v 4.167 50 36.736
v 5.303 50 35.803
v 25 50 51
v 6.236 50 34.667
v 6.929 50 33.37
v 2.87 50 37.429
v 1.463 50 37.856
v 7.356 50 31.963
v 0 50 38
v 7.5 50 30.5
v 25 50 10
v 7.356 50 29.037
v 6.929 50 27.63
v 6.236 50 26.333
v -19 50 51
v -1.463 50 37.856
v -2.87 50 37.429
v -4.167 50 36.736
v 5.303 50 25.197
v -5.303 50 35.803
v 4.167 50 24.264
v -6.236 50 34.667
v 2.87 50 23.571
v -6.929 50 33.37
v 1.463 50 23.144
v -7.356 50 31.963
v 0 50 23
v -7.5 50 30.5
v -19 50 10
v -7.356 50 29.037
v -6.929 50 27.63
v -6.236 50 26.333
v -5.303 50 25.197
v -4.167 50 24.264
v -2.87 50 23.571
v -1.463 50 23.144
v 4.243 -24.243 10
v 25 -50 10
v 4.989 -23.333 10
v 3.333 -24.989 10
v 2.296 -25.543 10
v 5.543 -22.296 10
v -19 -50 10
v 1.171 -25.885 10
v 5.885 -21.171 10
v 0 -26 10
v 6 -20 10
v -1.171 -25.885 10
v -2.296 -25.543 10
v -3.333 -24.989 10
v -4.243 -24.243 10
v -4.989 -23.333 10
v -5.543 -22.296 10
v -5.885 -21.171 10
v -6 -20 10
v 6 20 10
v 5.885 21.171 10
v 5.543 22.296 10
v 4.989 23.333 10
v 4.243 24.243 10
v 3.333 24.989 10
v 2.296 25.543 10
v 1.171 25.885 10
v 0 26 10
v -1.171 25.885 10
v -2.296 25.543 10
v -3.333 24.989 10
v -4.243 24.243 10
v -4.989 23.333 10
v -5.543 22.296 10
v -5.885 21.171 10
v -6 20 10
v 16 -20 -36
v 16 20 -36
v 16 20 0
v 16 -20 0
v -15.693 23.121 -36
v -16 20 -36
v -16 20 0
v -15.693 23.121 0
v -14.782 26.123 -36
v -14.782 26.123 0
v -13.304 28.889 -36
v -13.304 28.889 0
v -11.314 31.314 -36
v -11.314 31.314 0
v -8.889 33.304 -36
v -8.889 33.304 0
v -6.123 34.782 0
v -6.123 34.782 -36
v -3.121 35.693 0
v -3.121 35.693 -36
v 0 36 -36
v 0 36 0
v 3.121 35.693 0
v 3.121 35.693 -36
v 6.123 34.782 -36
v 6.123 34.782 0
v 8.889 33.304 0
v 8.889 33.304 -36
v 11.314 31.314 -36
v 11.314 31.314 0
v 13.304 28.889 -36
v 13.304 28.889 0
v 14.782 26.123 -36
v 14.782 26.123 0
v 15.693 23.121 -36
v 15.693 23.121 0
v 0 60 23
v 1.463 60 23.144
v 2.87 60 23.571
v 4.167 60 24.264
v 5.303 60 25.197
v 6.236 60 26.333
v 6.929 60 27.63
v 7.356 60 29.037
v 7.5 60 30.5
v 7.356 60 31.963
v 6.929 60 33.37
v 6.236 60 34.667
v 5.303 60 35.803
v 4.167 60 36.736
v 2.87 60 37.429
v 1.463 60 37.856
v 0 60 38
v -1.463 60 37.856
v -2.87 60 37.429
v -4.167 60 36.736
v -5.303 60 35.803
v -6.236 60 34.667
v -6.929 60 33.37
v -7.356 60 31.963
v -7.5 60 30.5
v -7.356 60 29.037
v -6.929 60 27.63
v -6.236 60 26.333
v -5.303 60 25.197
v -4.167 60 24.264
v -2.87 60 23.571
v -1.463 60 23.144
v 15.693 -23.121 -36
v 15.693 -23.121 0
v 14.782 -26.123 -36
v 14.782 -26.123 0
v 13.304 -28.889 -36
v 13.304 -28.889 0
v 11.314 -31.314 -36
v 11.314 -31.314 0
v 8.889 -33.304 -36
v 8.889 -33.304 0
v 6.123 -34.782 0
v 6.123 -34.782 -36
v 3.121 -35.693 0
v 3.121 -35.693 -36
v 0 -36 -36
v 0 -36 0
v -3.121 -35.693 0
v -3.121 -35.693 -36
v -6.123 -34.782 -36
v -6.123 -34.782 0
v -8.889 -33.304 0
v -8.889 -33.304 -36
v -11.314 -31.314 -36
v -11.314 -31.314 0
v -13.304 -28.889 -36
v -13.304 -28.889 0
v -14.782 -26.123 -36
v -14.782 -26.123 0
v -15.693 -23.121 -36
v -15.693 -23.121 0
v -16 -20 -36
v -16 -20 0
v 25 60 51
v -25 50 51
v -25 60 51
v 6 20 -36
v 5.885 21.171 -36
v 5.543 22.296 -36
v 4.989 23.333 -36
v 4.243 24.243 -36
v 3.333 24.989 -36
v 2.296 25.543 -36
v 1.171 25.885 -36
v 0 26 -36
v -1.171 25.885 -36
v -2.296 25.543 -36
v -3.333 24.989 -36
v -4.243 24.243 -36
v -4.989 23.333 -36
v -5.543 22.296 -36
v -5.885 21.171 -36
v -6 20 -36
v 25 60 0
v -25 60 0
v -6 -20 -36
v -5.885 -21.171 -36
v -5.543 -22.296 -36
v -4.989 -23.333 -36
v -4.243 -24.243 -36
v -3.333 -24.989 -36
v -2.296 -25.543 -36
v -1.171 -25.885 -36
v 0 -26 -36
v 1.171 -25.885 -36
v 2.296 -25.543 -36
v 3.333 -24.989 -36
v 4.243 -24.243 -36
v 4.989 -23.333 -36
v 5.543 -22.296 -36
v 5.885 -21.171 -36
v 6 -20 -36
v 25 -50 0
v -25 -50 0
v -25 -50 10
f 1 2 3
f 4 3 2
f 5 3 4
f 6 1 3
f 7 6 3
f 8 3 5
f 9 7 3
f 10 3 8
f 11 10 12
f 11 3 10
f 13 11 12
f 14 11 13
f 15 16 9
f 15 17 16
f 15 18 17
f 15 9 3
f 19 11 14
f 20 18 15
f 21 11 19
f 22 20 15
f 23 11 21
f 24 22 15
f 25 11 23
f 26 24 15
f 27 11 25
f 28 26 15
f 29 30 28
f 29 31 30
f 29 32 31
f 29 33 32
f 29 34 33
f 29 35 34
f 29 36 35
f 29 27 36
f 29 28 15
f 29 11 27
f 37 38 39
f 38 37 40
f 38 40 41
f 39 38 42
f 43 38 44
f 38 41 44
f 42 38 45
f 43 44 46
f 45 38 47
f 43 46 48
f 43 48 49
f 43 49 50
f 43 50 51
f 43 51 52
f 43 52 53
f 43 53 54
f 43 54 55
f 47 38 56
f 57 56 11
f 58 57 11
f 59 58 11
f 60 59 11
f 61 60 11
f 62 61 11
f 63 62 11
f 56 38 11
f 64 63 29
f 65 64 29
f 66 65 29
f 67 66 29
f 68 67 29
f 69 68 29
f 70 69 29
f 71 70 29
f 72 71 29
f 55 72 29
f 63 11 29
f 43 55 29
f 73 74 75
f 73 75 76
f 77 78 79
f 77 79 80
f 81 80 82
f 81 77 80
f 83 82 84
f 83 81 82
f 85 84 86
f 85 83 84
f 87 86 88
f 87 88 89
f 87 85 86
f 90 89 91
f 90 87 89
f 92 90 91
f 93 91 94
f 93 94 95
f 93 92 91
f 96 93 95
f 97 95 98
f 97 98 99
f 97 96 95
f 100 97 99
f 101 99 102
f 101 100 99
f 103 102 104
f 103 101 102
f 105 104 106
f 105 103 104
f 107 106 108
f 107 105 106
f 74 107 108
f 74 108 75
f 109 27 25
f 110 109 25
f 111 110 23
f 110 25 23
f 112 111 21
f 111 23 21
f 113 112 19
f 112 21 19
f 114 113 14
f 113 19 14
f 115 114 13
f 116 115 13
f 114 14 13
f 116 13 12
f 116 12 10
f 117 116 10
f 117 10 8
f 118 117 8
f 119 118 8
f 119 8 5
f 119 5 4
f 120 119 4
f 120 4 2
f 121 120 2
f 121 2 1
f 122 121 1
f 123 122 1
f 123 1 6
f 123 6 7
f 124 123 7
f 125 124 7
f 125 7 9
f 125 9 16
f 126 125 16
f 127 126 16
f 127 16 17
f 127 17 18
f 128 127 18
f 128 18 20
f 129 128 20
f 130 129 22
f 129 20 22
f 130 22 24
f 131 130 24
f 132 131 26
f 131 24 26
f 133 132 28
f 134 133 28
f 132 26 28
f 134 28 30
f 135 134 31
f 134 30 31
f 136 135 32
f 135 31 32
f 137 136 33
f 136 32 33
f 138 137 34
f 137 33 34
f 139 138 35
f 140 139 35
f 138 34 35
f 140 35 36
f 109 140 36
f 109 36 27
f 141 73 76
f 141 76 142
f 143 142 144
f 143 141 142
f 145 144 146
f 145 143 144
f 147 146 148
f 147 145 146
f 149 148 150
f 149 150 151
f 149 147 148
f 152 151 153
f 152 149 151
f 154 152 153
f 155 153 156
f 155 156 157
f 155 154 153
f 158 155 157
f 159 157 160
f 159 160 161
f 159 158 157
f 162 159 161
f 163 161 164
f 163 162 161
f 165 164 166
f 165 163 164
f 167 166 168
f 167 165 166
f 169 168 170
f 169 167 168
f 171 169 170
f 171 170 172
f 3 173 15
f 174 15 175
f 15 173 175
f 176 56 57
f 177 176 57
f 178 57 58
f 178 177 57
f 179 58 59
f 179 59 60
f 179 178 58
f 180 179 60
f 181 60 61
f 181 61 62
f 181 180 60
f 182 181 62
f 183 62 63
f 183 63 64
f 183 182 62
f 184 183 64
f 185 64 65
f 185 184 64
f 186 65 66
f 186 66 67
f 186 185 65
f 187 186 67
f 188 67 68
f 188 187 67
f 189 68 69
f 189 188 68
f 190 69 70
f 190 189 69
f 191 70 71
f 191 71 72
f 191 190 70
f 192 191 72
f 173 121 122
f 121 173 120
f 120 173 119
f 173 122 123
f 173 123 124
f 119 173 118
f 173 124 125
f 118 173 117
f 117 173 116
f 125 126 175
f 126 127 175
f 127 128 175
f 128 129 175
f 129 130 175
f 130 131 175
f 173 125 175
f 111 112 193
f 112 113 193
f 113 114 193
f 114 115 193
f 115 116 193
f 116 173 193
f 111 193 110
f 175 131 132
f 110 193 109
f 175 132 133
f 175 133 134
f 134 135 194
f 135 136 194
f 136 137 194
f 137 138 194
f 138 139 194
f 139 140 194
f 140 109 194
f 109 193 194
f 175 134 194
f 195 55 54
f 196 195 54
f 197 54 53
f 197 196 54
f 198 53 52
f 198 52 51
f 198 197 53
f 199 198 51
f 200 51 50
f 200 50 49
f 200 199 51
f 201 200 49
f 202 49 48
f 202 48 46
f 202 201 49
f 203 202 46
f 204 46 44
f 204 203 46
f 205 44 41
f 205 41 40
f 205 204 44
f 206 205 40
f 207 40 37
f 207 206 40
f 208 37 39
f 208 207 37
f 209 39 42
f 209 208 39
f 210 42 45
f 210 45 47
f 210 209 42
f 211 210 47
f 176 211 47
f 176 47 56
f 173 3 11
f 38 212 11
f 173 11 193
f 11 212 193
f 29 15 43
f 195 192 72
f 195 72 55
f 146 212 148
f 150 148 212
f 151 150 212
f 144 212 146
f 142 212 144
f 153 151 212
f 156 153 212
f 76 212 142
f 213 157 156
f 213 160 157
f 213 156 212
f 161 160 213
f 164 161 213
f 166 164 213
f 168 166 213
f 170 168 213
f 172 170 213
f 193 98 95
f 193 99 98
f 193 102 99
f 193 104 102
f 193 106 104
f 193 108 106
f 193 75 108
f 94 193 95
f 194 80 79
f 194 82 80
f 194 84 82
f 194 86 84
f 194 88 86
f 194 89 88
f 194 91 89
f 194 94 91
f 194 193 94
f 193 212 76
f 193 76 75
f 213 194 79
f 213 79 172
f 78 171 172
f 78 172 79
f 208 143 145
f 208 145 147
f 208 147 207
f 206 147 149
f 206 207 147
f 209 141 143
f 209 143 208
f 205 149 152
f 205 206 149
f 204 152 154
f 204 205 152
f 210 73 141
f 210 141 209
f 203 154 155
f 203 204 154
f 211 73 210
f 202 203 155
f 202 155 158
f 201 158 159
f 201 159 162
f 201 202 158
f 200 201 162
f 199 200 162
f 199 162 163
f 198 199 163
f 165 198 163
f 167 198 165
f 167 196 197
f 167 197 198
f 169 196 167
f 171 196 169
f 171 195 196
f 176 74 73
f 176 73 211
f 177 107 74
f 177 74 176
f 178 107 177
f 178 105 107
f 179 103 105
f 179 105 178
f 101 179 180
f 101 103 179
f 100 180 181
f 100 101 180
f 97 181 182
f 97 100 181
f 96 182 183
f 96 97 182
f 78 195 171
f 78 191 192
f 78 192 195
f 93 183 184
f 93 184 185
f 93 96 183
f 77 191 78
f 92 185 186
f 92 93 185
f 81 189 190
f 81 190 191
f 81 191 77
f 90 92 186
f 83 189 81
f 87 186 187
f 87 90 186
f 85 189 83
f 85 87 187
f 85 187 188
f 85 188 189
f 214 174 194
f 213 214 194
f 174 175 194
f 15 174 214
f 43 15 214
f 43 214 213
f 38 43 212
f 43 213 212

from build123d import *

# Parameters (mm, degrees)
SKETCH_1_W          = 50
SKETCH_1_H          = 100
EXTRUDE_1_DEPTH     = 10
EXTRUDE_START       = -36
EXTRUDE_2_DEPTH     = 36
SKETCH_2_W          = 50
SKETCH_2_H          = 10
EXTRUDE_3_DEPTH     = 51
SKETCH_3_R          = 7.5
CUT_EXTRUDE_1_DEPTH = 116.004347744
EXTRUDE_4_DEPTH     = 6


with BuildPart() as part:
    # Эскиз1 → Бобышка-Вытянуть1 (new body)
    with BuildSketch(Plane.XY):
        Rectangle(SKETCH_1_W, SKETCH_1_H)
        with BuildLine():
            ThreePointArc((6, -20), (0, -26), (-6, -20))
            Line((-6, -20), (-6, 20))
            ThreePointArc((-6, 20), (0, 26), (6, 20))
            Line((6, 20), (6, -20))
        make_face(mode=Mode.SUBTRACT)
    extrude(amount=EXTRUDE_1_DEPTH)

    # Эскиз1<3> → Бобышка-Вытянуть2 (add)
    with BuildSketch(Plane.XY.offset(EXTRUDE_START)):
        with BuildLine():
            Line((-16, 20), (-16, -20))
            ThreePointArc((-16, -20), (0, -36), (16, -20))
            Line((16, -20), (16, 20))
            ThreePointArc((16, 20), (0, 36), (-16, 20))
        make_face()
        with BuildLine():
            ThreePointArc((6, -20), (0, -26), (-6, -20))
            Line((-6, -20), (-6, 20))
            ThreePointArc((-6, 20), (0, 26), (6, 20))
            Line((6, 20), (6, -20))
        make_face(mode=Mode.SUBTRACT)
    extrude(amount=EXTRUDE_2_DEPTH)

    # Эскиз2 → Бобышка-Вытянуть3 (add)
    with BuildSketch(Plane(origin=(0, 0, 0), x_dir=(-1, 0, 0), z_dir=(0, 0, -1))):
        with Locations((0, 55)):
            Rectangle(SKETCH_2_W, SKETCH_2_H)
    extrude(amount=-EXTRUDE_3_DEPTH)

    # Эскиз3 → Вырез-Вытянуть1 (cut, through all)
    with BuildSketch(Plane.XZ.offset(-50)):
        with Locations((0, 30.5)):
            Circle(SKETCH_3_R)
    extrude(amount=-CUT_EXTRUDE_1_DEPTH, mode=Mode.SUBTRACT)

    # Эскиз4 → Бобышка-Вытянуть4 (add)
    with BuildSketch(Plane.ZY.offset(25)):
        Polygon((51, 50), (10, -50), (10, 50), align=None)
    extrude(amount=-EXTRUDE_4_DEPTH)


solid = part.part
